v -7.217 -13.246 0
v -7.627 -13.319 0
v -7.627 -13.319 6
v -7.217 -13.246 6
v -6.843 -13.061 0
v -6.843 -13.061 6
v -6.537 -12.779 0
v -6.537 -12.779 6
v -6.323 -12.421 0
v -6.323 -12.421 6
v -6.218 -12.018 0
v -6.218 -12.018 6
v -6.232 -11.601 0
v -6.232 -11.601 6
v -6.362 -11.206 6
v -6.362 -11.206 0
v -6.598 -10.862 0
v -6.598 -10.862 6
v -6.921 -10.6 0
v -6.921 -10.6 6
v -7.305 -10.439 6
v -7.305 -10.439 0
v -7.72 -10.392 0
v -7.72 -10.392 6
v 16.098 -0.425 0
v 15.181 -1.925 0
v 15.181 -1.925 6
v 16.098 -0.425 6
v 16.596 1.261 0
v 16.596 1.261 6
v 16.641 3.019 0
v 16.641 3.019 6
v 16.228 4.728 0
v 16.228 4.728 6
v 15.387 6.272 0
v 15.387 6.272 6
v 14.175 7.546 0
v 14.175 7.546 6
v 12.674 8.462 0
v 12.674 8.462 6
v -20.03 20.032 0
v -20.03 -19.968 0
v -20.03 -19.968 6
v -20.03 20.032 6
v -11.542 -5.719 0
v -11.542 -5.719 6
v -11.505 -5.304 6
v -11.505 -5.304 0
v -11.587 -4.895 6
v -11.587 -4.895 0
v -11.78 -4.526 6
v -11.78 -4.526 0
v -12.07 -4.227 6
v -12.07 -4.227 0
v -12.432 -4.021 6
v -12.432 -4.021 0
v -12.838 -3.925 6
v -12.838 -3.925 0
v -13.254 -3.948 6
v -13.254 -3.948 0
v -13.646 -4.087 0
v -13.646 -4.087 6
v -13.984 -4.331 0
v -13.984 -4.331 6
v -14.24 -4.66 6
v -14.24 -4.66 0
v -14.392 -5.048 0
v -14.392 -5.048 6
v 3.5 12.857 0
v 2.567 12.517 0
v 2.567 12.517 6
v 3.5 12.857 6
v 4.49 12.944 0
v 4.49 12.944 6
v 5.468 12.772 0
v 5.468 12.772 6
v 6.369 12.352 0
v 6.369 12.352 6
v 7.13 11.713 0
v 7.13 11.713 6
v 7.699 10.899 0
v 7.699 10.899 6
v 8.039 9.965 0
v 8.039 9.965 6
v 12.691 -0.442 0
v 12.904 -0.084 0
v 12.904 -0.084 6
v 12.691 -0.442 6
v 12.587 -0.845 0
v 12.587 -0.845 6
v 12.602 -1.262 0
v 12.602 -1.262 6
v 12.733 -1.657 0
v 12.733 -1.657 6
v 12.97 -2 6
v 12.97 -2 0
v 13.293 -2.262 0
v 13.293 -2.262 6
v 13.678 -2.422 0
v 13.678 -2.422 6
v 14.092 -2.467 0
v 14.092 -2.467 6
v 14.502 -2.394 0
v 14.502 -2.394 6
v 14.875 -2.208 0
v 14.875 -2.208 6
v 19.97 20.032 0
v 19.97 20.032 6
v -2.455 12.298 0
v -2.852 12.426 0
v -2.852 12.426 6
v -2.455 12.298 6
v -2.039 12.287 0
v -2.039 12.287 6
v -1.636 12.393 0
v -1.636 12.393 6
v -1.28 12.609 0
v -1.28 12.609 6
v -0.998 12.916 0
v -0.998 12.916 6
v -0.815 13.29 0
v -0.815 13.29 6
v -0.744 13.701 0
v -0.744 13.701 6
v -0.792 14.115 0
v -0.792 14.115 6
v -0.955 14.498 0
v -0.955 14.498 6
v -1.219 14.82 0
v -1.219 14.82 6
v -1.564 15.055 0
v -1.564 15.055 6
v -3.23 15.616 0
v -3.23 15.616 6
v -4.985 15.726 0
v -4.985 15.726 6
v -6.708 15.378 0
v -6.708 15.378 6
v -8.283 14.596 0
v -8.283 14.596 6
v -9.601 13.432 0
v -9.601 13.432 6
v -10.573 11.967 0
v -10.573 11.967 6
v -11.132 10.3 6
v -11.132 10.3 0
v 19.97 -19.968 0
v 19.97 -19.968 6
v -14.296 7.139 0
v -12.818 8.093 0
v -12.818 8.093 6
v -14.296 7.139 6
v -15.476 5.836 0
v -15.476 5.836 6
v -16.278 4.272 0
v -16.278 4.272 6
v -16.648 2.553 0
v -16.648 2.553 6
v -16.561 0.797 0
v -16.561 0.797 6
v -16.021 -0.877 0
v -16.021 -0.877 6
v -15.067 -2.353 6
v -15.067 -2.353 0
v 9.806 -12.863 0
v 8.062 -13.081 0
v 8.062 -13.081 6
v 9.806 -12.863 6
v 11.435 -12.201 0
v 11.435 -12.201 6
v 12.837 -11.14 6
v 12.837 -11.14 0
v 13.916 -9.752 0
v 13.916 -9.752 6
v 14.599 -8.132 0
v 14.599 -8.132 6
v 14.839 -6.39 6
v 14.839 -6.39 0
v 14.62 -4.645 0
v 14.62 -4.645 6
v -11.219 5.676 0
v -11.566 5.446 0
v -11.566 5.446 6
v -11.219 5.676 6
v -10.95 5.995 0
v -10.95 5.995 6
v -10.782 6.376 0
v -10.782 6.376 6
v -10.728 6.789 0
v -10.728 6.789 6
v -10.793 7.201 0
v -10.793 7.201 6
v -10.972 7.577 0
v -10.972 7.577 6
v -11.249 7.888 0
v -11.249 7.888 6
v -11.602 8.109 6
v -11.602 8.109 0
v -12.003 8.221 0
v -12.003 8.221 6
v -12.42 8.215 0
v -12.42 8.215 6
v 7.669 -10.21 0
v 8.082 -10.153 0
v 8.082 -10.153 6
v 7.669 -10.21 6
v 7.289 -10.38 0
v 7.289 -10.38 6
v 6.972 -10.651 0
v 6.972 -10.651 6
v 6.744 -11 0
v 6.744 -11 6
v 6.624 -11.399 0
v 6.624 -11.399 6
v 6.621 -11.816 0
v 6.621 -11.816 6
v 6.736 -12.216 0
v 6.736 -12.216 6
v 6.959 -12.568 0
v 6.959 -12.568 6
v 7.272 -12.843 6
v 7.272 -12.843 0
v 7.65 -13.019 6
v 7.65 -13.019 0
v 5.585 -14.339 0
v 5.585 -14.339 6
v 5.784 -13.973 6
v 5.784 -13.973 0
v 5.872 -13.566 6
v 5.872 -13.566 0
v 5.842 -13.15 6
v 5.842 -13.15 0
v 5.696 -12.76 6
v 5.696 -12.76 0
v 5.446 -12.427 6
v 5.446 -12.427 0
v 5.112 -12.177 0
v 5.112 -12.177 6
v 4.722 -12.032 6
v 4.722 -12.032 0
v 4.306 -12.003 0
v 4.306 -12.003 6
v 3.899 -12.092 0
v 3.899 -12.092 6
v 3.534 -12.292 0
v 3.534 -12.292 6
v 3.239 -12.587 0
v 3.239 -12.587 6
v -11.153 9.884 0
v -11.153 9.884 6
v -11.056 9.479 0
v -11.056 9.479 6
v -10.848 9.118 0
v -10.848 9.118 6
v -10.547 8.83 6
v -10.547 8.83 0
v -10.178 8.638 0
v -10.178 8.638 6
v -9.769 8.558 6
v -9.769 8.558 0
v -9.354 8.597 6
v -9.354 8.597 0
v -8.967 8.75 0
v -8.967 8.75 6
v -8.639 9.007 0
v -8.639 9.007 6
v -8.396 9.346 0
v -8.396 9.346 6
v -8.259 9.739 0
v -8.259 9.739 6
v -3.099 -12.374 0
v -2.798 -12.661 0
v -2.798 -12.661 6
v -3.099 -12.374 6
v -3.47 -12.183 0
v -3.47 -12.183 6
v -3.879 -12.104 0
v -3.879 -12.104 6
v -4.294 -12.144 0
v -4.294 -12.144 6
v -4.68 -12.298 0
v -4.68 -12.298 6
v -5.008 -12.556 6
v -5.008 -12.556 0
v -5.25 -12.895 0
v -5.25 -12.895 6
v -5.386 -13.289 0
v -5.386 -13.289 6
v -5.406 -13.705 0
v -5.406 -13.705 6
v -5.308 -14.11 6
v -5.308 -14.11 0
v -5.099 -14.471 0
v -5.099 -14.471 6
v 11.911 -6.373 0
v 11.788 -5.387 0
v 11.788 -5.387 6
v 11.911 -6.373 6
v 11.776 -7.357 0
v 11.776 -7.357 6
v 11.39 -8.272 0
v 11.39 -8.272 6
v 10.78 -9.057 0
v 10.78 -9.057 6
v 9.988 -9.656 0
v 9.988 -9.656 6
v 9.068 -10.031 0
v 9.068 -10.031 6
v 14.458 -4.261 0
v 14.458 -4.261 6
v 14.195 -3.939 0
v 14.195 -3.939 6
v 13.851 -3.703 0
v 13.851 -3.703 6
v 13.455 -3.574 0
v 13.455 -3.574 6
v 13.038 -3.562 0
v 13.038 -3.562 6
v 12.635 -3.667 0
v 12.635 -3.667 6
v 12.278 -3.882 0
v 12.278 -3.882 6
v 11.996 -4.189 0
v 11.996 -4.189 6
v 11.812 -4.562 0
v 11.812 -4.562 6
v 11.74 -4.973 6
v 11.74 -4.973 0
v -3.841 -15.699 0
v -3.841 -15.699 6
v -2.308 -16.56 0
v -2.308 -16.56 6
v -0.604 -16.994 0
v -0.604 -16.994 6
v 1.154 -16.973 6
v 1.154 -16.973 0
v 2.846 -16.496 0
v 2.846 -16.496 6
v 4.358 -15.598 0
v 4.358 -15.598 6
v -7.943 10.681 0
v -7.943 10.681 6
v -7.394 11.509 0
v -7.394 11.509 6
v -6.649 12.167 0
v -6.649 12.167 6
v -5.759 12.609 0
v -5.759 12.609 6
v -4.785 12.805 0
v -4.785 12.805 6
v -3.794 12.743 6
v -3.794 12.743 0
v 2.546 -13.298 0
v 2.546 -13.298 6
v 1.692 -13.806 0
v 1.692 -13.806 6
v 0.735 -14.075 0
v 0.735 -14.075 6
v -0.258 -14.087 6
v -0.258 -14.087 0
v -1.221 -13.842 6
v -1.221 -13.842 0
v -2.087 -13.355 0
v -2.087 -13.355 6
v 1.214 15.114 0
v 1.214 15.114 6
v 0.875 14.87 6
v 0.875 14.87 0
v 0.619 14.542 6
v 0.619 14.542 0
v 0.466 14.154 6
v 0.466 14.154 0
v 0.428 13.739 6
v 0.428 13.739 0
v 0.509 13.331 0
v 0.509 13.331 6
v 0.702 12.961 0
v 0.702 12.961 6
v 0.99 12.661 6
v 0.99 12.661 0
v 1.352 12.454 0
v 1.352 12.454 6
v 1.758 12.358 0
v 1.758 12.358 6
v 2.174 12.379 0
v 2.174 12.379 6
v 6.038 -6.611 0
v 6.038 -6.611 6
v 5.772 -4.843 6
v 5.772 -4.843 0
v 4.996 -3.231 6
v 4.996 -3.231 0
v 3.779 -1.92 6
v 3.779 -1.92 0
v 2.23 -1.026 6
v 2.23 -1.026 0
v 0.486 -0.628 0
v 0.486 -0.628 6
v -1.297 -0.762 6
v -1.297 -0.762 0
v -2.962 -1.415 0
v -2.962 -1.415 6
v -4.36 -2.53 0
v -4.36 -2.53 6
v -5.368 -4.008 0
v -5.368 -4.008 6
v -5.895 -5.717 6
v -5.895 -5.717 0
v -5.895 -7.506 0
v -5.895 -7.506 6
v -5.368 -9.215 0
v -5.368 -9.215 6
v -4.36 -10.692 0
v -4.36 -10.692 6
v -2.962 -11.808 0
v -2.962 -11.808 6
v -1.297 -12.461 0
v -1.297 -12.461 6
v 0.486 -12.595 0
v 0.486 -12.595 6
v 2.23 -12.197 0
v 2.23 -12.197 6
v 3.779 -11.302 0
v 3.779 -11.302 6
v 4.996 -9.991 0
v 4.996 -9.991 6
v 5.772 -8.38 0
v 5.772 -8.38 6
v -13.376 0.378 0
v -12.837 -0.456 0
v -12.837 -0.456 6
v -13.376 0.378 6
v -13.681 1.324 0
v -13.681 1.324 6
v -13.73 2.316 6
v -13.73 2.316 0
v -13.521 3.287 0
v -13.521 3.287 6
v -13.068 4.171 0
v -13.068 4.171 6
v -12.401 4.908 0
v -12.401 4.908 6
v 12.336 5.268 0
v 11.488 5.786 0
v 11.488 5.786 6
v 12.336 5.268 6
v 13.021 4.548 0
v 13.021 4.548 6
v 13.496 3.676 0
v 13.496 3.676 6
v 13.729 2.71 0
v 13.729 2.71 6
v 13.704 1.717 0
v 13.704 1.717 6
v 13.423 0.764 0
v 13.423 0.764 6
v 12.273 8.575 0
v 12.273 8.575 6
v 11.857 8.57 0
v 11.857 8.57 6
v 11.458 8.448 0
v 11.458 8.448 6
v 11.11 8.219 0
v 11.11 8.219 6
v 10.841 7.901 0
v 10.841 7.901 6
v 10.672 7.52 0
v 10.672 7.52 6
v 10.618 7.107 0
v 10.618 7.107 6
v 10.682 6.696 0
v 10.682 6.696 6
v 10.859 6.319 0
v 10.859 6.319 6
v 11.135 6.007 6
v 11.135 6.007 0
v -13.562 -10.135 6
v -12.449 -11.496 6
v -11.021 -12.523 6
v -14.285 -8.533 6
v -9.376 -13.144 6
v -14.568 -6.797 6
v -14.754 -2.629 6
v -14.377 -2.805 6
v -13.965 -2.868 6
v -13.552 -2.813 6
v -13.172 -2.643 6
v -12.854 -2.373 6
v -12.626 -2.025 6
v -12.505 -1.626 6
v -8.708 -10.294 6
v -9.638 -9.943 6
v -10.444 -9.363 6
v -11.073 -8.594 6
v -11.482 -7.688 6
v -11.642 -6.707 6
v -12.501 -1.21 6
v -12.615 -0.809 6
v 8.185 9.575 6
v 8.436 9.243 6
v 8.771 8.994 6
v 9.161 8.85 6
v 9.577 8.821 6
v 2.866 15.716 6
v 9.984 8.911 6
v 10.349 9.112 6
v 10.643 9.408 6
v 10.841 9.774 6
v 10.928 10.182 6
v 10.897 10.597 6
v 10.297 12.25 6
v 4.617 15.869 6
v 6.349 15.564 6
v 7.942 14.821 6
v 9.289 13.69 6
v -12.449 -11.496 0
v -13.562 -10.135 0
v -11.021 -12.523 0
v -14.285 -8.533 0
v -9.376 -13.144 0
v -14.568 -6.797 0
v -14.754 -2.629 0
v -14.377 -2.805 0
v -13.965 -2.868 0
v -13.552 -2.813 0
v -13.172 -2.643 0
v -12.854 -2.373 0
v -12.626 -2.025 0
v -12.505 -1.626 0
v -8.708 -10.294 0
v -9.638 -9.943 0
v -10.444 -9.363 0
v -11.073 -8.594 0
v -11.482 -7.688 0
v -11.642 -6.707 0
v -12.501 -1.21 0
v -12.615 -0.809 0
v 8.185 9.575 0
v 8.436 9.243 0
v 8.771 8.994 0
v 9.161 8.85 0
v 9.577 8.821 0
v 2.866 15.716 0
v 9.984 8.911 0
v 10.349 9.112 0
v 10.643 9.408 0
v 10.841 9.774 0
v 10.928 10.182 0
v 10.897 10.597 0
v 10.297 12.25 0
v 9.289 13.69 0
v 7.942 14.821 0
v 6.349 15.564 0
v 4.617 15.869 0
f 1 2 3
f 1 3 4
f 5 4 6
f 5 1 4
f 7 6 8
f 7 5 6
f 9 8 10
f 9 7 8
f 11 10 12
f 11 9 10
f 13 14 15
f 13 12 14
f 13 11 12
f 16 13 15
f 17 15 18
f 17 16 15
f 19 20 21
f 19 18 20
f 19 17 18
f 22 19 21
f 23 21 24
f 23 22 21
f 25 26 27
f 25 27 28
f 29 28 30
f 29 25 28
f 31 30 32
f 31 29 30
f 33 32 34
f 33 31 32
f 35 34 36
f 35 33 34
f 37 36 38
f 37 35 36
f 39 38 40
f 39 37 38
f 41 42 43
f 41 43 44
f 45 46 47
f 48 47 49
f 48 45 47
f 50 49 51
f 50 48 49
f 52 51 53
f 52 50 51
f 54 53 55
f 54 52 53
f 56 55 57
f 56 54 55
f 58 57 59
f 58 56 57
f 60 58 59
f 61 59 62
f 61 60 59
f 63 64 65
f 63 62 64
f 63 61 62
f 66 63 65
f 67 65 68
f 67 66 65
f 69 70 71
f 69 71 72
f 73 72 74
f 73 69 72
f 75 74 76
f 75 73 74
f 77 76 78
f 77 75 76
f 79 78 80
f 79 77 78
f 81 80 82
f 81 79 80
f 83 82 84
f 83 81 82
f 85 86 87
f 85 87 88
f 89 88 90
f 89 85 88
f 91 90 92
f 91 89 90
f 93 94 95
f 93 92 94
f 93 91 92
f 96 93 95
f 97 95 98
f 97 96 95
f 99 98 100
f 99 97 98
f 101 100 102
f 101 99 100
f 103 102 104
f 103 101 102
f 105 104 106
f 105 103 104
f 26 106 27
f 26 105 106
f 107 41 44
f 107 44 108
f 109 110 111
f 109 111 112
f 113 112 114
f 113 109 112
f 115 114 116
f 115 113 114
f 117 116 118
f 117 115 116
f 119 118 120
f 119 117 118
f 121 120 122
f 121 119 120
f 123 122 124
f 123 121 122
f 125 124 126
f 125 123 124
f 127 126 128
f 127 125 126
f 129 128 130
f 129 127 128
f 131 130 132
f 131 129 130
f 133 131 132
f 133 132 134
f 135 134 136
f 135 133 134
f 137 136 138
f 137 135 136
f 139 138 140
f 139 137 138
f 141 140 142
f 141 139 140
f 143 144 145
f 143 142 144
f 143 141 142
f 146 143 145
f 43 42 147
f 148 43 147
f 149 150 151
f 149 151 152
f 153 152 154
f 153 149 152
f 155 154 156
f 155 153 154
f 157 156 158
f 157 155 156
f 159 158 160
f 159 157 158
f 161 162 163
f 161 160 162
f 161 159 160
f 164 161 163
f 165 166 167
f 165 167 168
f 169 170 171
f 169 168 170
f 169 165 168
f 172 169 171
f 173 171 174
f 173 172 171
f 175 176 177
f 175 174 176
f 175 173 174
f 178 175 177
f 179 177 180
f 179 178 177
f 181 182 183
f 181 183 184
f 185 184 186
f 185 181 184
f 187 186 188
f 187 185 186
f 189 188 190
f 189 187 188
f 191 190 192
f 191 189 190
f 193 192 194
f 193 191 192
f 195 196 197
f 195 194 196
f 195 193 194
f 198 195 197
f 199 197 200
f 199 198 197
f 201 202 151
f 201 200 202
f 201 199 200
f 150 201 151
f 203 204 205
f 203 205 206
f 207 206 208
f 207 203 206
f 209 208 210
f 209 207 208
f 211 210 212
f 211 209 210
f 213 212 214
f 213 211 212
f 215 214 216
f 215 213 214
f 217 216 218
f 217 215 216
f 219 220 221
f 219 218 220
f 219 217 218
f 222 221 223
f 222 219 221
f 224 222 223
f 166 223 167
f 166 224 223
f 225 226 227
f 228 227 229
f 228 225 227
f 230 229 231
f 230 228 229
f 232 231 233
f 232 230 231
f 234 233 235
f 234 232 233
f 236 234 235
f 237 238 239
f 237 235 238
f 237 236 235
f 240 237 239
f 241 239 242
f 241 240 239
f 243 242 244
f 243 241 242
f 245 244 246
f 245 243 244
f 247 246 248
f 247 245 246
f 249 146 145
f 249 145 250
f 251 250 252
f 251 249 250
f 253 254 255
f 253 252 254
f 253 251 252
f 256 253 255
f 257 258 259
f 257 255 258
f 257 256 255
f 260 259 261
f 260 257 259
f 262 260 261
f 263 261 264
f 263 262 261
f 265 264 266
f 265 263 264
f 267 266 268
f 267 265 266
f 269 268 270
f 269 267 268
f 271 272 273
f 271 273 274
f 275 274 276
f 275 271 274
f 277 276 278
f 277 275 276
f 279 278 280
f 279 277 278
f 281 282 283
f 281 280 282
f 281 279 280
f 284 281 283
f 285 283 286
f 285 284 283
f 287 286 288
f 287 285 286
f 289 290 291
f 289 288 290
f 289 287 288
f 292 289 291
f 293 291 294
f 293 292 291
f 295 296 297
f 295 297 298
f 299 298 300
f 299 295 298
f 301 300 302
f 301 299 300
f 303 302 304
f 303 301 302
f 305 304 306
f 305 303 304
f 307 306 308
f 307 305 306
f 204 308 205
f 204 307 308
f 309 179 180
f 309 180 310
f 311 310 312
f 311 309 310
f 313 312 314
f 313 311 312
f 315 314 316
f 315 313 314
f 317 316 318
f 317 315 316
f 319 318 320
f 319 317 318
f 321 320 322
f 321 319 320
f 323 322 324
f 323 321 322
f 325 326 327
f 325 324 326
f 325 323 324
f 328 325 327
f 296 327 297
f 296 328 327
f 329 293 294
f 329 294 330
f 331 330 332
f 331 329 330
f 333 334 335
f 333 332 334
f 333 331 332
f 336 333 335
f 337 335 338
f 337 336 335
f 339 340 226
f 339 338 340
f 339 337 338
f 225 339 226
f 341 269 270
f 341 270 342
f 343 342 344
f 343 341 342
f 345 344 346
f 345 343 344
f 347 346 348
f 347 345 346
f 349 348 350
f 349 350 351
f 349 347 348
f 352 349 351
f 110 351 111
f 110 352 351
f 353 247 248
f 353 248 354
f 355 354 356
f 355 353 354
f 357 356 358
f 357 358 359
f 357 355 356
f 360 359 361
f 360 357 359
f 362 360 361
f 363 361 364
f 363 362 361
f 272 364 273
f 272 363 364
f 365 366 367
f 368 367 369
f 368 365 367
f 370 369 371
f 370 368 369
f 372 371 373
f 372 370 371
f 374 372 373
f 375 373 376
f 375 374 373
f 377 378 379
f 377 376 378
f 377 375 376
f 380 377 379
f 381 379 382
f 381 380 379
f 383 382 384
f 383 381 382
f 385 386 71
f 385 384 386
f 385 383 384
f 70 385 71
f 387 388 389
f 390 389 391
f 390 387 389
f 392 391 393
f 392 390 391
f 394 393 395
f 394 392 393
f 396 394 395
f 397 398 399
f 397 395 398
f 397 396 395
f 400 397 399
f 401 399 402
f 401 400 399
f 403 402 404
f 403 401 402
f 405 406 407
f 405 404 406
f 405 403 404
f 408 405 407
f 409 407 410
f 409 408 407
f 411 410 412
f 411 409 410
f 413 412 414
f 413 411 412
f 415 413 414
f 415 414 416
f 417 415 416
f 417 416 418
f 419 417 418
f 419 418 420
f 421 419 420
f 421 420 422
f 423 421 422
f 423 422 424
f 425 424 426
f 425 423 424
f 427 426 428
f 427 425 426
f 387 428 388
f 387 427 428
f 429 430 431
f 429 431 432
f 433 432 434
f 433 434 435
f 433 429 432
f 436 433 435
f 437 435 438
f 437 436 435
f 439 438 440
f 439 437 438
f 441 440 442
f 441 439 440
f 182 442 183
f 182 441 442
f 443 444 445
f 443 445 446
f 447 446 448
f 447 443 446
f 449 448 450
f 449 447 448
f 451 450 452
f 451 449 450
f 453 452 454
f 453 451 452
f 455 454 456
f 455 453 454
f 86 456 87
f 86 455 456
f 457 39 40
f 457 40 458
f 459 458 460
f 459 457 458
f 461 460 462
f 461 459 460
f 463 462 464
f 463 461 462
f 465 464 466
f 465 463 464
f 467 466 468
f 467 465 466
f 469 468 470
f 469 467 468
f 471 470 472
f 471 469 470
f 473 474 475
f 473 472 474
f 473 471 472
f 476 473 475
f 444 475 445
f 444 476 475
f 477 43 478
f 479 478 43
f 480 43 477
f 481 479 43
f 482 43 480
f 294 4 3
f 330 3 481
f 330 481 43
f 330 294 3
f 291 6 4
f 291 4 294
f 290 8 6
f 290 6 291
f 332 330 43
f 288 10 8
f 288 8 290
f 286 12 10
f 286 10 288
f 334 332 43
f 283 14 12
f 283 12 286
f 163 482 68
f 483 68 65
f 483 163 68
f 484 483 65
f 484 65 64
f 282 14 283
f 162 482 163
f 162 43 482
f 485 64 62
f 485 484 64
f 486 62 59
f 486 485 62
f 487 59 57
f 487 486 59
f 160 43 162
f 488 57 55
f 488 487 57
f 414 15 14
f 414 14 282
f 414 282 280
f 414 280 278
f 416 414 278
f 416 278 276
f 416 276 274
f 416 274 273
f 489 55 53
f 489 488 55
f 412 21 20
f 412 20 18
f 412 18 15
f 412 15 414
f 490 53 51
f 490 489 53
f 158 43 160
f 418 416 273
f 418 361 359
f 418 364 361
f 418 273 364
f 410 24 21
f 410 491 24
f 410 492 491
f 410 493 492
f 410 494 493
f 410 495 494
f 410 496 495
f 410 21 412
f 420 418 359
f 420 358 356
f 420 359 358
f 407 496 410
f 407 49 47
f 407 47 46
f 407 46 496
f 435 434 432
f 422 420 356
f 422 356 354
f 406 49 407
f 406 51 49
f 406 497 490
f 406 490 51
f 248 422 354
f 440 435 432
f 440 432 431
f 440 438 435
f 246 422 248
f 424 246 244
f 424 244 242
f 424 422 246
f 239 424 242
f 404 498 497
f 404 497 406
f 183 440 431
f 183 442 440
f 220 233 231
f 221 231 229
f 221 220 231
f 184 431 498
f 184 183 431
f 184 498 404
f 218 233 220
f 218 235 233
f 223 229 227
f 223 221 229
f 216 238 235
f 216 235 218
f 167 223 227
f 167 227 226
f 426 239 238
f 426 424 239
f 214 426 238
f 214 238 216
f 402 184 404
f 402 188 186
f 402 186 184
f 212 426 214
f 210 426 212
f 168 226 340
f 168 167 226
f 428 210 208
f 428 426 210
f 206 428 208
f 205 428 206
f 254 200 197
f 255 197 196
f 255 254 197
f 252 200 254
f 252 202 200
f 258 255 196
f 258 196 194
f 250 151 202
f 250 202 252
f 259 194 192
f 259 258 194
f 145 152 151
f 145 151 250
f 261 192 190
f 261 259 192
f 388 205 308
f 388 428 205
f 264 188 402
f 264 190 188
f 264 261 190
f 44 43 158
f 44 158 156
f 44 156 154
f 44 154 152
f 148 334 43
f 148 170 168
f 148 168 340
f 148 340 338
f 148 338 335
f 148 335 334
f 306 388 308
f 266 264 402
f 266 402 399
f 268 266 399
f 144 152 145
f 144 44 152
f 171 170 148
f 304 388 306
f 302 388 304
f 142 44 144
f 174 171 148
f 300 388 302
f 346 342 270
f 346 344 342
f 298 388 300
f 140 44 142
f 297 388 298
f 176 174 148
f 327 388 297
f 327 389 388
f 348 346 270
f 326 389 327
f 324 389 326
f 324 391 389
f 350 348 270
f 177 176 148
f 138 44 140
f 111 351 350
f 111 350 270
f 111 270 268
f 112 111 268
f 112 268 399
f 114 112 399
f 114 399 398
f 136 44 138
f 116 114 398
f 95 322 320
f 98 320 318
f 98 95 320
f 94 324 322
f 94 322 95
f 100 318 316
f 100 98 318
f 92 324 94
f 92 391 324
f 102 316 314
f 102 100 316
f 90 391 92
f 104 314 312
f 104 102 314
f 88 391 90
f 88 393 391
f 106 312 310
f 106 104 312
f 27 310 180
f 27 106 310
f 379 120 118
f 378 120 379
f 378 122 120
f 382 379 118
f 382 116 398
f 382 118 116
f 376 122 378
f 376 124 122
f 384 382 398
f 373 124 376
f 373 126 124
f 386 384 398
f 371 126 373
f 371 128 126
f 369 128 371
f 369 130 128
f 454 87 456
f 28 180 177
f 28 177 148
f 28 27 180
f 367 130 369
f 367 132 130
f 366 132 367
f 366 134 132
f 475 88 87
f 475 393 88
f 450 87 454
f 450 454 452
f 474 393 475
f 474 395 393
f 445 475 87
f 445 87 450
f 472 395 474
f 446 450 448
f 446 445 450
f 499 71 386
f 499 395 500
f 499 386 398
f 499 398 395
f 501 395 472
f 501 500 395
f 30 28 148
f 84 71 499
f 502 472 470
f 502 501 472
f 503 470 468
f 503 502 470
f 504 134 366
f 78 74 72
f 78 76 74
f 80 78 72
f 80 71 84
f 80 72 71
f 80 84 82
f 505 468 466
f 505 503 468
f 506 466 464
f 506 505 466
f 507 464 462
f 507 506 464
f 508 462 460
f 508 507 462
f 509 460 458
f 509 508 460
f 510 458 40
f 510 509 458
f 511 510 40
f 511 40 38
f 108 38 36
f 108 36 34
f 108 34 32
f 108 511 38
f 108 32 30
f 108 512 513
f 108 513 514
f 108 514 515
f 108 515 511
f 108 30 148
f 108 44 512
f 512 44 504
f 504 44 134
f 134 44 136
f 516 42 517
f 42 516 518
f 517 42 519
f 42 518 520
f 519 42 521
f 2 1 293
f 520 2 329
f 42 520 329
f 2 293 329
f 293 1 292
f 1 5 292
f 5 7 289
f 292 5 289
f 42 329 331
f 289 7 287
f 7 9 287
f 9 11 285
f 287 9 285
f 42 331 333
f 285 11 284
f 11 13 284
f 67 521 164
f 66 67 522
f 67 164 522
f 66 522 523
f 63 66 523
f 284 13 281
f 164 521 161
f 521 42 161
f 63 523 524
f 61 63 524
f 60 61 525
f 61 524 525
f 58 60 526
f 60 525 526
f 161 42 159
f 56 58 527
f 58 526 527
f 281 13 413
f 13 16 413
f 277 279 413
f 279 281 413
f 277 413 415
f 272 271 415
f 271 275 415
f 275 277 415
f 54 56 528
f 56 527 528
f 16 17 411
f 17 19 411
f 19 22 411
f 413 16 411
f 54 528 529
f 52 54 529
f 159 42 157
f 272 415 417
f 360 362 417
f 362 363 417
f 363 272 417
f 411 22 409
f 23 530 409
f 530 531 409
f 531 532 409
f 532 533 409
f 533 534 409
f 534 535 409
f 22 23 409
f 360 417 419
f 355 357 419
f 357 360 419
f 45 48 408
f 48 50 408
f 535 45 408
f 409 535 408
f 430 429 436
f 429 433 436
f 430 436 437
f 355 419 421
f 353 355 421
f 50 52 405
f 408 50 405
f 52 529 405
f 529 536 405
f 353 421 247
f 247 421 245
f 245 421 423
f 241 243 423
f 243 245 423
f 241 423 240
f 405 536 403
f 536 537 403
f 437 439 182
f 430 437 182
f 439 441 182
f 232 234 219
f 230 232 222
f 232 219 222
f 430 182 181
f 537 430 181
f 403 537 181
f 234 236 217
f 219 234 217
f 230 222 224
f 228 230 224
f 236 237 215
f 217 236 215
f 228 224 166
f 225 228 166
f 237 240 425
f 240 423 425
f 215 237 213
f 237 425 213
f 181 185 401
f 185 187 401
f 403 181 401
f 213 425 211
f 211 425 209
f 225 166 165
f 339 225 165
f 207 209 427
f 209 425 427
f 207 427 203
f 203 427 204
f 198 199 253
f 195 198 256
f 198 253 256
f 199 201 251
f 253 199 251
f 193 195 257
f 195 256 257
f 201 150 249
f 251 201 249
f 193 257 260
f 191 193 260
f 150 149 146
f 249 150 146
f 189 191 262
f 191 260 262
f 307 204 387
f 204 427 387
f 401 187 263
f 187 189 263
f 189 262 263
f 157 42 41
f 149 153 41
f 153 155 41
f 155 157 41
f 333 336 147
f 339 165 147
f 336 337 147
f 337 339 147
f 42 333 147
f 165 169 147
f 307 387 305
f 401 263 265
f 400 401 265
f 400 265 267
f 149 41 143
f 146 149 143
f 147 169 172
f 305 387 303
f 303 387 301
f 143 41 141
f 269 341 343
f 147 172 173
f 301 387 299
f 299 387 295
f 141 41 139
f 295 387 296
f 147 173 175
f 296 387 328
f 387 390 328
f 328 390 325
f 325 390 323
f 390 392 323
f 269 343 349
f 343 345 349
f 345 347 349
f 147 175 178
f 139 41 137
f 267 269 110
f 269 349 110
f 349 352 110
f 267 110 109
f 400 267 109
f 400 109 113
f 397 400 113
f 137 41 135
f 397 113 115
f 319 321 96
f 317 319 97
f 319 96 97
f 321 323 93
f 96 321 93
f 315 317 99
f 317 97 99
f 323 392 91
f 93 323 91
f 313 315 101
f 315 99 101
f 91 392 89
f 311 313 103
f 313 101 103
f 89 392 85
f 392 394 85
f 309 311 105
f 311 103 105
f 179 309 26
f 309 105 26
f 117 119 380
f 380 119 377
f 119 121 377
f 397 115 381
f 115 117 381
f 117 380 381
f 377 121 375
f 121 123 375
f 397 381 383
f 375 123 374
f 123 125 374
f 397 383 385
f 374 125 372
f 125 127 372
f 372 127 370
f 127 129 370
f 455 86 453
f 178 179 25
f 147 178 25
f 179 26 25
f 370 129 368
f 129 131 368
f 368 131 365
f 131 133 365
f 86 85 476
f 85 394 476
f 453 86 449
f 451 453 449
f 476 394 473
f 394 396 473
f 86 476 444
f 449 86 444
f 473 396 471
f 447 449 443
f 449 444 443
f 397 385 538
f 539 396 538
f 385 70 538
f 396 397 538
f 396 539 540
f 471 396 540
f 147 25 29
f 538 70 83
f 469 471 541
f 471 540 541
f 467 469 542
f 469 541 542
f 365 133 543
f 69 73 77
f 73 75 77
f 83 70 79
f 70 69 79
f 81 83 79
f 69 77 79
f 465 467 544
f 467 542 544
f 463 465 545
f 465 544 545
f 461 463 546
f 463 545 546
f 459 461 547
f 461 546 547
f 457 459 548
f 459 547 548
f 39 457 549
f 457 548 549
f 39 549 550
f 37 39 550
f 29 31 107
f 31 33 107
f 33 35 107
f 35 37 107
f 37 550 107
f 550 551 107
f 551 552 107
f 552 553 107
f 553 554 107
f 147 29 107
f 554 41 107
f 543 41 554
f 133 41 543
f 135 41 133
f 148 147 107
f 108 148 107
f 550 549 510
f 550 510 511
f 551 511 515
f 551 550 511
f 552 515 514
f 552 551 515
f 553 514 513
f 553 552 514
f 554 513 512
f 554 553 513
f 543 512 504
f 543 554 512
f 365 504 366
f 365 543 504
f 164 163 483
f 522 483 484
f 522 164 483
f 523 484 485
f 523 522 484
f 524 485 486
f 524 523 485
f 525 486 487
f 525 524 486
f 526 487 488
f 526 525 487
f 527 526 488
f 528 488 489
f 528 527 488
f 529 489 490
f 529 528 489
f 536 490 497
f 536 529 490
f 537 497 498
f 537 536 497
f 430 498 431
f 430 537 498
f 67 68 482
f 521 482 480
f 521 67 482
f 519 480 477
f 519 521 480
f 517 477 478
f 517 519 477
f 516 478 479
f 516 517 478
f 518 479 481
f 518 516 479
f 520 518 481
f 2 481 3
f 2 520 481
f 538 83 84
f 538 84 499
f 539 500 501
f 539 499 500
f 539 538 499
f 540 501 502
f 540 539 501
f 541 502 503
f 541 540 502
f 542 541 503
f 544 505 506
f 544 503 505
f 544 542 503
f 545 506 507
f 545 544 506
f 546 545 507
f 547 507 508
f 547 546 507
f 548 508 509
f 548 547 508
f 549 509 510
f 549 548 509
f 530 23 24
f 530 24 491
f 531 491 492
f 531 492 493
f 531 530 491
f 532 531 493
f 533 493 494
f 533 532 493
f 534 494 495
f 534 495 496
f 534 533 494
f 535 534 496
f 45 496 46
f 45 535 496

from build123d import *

# Parameters (mm, degrees)
SKETCH1_W           = 40
SKETCH1_H           = 40
BOSS_EXTRUDE1_DEPTH = 6
SKETCH3_R           = 6
CUT_EXTRUDE1_DEPTH  = 29.956627751


with BuildPart() as part:
    # Sketch1 → Boss-Extrude1 (new body)
    with BuildSketch(Plane.XY):
        with Locations((-0.03035818, 0.031750845)):
            Rectangle(SKETCH1_W, SKETCH1_H)
    extrude(amount=BOSS_EXTRUDE1_DEPTH)

    # Sketch3 → Cut-Extrude1 (cut, through all)
    with BuildSketch(Plane.XY):
        with Locations((0.03811678, -6.611407744)):
            Circle(SKETCH3_R)
        with BuildLine():
            ThreePointArc((-1.563550895, 15.055123875), (-7.521124365, 15.038743131), (-11.132245635, 10.300309513))
            ThreePointArc((-11.132245635, 10.300309513), (-9.975977933, 8.583173649), (-8.258842069, 9.739441351))
            ThreePointArc((-8.258842069, 9.739441351), (-6.218325676, 12.416961919), (-2.851912471, 12.426218095))
            ThreePointArc((-2.851912471, 12.426218095), (-0.893278793, 13.096490197), (-1.563550895, 15.055123875))
        make_face()
        with BuildLine():
            ThreePointArc((10.897165218, 10.597004263), (7.169871935, 15.244609534), (1.213718069, 15.113532793))
            ThreePointArc((1.213718069, 15.113532793), (0.592128311, 13.138909601), (2.566751502, 12.517319844))
            ThreePointArc((2.566751502, 12.517319844), (5.932362539, 12.591386656), (8.038523611, 9.965189961))
            ThreePointArc((8.038523611, 9.965189961), (9.783751566, 8.851776308), (10.897165218, 10.597004263))
        make_face()
        with BuildLine():
            ThreePointArc((15.180796373, -1.924768002), (16.490511142, 3.887081721), (12.674430025, 8.462065316))
            ThreePointArc((12.674430025, 8.462065316), (10.743052573, 7.716886336), (11.488231553, 5.785508884))
            ThreePointArc((11.488231553, 5.785508884), (13.644563477, 3.20034812), (12.904490171, -0.083721771))
            ThreePointArc((12.904490171, -0.083721771), (13.122120157, -2.142397987), (15.180796373, -1.924768002))
        make_face()
        with BuildLine():
            ThreePointArc((8.06168094, -13.081043006), (13.422161827, -10.481390213), (14.619740374, -4.645402241))
            ThreePointArc((14.619740374, -4.645402241), (12.832941842, -3.60000204), (11.78754164, -5.386800572))
            ThreePointArc((11.78754164, -5.386800572), (11.110832531, -8.684510129), (8.081815142, -10.153481604))
            ThreePointArc((8.081815142, -10.153481604), (6.60796734, -11.607195205), (8.06168094, -13.081043006))
        make_face()
        with BuildLine():
            ThreePointArc((-5.099341956, -14.470918126), (0.275353607, -17.041053839), (5.584790746, -14.338679466))
            ThreePointArc((5.584790746, -14.338679466), (5.288066872, -12.289907756), (3.239295163, -12.586631629))
            ThreePointArc((3.239295163, -12.586631629), (0.239120783, -14.113647422), (-2.797928816, -12.661355))
            ThreePointArc((-2.797928816, -12.661355), (-4.853416949, -12.415429993), (-5.099341956, -14.470918126))
        make_face()
        with BuildLine():
            ThreePointArc((-14.391753639, -5.047789047), (-13.050098782, -10.852348653), (-7.62691751, -13.3185309))
            ThreePointArc((-7.62691751, -13.3185309), (-6.210127596, -11.809154567), (-7.719503929, -10.392364653))
            ThreePointArc((-7.719503929, -10.392364653), (-10.783951079, -8.998812644), (-11.542072595, -5.718862139))
            ThreePointArc((-11.542072595, -5.718862139), (-12.63137657, -3.958485071), (-14.391753639, -5.047789047))
        make_face()
        with BuildLine():
            ThreePointArc((-12.81817858, 8.092535837), (-16.519857902, 3.424504113), (-15.066698607, -2.353149221))
            ThreePointArc((-15.066698607, -2.353149221), (-13.003266608, -2.519759429), (-12.8366564, -0.456327431))
            ThreePointArc((-12.8366564, -0.456327431), (-13.657785113, 2.808419294), (-11.566097582, 5.446158252))
            ThreePointArc((-11.566097582, 5.446158252), (-10.868949288, 7.395387544), (-12.81817858, 8.092535837))
        make_face()
    extrude(amount=CUT_EXTRUDE1_DEPTH, mode=Mode.SUBTRACT)


solid = part.part
